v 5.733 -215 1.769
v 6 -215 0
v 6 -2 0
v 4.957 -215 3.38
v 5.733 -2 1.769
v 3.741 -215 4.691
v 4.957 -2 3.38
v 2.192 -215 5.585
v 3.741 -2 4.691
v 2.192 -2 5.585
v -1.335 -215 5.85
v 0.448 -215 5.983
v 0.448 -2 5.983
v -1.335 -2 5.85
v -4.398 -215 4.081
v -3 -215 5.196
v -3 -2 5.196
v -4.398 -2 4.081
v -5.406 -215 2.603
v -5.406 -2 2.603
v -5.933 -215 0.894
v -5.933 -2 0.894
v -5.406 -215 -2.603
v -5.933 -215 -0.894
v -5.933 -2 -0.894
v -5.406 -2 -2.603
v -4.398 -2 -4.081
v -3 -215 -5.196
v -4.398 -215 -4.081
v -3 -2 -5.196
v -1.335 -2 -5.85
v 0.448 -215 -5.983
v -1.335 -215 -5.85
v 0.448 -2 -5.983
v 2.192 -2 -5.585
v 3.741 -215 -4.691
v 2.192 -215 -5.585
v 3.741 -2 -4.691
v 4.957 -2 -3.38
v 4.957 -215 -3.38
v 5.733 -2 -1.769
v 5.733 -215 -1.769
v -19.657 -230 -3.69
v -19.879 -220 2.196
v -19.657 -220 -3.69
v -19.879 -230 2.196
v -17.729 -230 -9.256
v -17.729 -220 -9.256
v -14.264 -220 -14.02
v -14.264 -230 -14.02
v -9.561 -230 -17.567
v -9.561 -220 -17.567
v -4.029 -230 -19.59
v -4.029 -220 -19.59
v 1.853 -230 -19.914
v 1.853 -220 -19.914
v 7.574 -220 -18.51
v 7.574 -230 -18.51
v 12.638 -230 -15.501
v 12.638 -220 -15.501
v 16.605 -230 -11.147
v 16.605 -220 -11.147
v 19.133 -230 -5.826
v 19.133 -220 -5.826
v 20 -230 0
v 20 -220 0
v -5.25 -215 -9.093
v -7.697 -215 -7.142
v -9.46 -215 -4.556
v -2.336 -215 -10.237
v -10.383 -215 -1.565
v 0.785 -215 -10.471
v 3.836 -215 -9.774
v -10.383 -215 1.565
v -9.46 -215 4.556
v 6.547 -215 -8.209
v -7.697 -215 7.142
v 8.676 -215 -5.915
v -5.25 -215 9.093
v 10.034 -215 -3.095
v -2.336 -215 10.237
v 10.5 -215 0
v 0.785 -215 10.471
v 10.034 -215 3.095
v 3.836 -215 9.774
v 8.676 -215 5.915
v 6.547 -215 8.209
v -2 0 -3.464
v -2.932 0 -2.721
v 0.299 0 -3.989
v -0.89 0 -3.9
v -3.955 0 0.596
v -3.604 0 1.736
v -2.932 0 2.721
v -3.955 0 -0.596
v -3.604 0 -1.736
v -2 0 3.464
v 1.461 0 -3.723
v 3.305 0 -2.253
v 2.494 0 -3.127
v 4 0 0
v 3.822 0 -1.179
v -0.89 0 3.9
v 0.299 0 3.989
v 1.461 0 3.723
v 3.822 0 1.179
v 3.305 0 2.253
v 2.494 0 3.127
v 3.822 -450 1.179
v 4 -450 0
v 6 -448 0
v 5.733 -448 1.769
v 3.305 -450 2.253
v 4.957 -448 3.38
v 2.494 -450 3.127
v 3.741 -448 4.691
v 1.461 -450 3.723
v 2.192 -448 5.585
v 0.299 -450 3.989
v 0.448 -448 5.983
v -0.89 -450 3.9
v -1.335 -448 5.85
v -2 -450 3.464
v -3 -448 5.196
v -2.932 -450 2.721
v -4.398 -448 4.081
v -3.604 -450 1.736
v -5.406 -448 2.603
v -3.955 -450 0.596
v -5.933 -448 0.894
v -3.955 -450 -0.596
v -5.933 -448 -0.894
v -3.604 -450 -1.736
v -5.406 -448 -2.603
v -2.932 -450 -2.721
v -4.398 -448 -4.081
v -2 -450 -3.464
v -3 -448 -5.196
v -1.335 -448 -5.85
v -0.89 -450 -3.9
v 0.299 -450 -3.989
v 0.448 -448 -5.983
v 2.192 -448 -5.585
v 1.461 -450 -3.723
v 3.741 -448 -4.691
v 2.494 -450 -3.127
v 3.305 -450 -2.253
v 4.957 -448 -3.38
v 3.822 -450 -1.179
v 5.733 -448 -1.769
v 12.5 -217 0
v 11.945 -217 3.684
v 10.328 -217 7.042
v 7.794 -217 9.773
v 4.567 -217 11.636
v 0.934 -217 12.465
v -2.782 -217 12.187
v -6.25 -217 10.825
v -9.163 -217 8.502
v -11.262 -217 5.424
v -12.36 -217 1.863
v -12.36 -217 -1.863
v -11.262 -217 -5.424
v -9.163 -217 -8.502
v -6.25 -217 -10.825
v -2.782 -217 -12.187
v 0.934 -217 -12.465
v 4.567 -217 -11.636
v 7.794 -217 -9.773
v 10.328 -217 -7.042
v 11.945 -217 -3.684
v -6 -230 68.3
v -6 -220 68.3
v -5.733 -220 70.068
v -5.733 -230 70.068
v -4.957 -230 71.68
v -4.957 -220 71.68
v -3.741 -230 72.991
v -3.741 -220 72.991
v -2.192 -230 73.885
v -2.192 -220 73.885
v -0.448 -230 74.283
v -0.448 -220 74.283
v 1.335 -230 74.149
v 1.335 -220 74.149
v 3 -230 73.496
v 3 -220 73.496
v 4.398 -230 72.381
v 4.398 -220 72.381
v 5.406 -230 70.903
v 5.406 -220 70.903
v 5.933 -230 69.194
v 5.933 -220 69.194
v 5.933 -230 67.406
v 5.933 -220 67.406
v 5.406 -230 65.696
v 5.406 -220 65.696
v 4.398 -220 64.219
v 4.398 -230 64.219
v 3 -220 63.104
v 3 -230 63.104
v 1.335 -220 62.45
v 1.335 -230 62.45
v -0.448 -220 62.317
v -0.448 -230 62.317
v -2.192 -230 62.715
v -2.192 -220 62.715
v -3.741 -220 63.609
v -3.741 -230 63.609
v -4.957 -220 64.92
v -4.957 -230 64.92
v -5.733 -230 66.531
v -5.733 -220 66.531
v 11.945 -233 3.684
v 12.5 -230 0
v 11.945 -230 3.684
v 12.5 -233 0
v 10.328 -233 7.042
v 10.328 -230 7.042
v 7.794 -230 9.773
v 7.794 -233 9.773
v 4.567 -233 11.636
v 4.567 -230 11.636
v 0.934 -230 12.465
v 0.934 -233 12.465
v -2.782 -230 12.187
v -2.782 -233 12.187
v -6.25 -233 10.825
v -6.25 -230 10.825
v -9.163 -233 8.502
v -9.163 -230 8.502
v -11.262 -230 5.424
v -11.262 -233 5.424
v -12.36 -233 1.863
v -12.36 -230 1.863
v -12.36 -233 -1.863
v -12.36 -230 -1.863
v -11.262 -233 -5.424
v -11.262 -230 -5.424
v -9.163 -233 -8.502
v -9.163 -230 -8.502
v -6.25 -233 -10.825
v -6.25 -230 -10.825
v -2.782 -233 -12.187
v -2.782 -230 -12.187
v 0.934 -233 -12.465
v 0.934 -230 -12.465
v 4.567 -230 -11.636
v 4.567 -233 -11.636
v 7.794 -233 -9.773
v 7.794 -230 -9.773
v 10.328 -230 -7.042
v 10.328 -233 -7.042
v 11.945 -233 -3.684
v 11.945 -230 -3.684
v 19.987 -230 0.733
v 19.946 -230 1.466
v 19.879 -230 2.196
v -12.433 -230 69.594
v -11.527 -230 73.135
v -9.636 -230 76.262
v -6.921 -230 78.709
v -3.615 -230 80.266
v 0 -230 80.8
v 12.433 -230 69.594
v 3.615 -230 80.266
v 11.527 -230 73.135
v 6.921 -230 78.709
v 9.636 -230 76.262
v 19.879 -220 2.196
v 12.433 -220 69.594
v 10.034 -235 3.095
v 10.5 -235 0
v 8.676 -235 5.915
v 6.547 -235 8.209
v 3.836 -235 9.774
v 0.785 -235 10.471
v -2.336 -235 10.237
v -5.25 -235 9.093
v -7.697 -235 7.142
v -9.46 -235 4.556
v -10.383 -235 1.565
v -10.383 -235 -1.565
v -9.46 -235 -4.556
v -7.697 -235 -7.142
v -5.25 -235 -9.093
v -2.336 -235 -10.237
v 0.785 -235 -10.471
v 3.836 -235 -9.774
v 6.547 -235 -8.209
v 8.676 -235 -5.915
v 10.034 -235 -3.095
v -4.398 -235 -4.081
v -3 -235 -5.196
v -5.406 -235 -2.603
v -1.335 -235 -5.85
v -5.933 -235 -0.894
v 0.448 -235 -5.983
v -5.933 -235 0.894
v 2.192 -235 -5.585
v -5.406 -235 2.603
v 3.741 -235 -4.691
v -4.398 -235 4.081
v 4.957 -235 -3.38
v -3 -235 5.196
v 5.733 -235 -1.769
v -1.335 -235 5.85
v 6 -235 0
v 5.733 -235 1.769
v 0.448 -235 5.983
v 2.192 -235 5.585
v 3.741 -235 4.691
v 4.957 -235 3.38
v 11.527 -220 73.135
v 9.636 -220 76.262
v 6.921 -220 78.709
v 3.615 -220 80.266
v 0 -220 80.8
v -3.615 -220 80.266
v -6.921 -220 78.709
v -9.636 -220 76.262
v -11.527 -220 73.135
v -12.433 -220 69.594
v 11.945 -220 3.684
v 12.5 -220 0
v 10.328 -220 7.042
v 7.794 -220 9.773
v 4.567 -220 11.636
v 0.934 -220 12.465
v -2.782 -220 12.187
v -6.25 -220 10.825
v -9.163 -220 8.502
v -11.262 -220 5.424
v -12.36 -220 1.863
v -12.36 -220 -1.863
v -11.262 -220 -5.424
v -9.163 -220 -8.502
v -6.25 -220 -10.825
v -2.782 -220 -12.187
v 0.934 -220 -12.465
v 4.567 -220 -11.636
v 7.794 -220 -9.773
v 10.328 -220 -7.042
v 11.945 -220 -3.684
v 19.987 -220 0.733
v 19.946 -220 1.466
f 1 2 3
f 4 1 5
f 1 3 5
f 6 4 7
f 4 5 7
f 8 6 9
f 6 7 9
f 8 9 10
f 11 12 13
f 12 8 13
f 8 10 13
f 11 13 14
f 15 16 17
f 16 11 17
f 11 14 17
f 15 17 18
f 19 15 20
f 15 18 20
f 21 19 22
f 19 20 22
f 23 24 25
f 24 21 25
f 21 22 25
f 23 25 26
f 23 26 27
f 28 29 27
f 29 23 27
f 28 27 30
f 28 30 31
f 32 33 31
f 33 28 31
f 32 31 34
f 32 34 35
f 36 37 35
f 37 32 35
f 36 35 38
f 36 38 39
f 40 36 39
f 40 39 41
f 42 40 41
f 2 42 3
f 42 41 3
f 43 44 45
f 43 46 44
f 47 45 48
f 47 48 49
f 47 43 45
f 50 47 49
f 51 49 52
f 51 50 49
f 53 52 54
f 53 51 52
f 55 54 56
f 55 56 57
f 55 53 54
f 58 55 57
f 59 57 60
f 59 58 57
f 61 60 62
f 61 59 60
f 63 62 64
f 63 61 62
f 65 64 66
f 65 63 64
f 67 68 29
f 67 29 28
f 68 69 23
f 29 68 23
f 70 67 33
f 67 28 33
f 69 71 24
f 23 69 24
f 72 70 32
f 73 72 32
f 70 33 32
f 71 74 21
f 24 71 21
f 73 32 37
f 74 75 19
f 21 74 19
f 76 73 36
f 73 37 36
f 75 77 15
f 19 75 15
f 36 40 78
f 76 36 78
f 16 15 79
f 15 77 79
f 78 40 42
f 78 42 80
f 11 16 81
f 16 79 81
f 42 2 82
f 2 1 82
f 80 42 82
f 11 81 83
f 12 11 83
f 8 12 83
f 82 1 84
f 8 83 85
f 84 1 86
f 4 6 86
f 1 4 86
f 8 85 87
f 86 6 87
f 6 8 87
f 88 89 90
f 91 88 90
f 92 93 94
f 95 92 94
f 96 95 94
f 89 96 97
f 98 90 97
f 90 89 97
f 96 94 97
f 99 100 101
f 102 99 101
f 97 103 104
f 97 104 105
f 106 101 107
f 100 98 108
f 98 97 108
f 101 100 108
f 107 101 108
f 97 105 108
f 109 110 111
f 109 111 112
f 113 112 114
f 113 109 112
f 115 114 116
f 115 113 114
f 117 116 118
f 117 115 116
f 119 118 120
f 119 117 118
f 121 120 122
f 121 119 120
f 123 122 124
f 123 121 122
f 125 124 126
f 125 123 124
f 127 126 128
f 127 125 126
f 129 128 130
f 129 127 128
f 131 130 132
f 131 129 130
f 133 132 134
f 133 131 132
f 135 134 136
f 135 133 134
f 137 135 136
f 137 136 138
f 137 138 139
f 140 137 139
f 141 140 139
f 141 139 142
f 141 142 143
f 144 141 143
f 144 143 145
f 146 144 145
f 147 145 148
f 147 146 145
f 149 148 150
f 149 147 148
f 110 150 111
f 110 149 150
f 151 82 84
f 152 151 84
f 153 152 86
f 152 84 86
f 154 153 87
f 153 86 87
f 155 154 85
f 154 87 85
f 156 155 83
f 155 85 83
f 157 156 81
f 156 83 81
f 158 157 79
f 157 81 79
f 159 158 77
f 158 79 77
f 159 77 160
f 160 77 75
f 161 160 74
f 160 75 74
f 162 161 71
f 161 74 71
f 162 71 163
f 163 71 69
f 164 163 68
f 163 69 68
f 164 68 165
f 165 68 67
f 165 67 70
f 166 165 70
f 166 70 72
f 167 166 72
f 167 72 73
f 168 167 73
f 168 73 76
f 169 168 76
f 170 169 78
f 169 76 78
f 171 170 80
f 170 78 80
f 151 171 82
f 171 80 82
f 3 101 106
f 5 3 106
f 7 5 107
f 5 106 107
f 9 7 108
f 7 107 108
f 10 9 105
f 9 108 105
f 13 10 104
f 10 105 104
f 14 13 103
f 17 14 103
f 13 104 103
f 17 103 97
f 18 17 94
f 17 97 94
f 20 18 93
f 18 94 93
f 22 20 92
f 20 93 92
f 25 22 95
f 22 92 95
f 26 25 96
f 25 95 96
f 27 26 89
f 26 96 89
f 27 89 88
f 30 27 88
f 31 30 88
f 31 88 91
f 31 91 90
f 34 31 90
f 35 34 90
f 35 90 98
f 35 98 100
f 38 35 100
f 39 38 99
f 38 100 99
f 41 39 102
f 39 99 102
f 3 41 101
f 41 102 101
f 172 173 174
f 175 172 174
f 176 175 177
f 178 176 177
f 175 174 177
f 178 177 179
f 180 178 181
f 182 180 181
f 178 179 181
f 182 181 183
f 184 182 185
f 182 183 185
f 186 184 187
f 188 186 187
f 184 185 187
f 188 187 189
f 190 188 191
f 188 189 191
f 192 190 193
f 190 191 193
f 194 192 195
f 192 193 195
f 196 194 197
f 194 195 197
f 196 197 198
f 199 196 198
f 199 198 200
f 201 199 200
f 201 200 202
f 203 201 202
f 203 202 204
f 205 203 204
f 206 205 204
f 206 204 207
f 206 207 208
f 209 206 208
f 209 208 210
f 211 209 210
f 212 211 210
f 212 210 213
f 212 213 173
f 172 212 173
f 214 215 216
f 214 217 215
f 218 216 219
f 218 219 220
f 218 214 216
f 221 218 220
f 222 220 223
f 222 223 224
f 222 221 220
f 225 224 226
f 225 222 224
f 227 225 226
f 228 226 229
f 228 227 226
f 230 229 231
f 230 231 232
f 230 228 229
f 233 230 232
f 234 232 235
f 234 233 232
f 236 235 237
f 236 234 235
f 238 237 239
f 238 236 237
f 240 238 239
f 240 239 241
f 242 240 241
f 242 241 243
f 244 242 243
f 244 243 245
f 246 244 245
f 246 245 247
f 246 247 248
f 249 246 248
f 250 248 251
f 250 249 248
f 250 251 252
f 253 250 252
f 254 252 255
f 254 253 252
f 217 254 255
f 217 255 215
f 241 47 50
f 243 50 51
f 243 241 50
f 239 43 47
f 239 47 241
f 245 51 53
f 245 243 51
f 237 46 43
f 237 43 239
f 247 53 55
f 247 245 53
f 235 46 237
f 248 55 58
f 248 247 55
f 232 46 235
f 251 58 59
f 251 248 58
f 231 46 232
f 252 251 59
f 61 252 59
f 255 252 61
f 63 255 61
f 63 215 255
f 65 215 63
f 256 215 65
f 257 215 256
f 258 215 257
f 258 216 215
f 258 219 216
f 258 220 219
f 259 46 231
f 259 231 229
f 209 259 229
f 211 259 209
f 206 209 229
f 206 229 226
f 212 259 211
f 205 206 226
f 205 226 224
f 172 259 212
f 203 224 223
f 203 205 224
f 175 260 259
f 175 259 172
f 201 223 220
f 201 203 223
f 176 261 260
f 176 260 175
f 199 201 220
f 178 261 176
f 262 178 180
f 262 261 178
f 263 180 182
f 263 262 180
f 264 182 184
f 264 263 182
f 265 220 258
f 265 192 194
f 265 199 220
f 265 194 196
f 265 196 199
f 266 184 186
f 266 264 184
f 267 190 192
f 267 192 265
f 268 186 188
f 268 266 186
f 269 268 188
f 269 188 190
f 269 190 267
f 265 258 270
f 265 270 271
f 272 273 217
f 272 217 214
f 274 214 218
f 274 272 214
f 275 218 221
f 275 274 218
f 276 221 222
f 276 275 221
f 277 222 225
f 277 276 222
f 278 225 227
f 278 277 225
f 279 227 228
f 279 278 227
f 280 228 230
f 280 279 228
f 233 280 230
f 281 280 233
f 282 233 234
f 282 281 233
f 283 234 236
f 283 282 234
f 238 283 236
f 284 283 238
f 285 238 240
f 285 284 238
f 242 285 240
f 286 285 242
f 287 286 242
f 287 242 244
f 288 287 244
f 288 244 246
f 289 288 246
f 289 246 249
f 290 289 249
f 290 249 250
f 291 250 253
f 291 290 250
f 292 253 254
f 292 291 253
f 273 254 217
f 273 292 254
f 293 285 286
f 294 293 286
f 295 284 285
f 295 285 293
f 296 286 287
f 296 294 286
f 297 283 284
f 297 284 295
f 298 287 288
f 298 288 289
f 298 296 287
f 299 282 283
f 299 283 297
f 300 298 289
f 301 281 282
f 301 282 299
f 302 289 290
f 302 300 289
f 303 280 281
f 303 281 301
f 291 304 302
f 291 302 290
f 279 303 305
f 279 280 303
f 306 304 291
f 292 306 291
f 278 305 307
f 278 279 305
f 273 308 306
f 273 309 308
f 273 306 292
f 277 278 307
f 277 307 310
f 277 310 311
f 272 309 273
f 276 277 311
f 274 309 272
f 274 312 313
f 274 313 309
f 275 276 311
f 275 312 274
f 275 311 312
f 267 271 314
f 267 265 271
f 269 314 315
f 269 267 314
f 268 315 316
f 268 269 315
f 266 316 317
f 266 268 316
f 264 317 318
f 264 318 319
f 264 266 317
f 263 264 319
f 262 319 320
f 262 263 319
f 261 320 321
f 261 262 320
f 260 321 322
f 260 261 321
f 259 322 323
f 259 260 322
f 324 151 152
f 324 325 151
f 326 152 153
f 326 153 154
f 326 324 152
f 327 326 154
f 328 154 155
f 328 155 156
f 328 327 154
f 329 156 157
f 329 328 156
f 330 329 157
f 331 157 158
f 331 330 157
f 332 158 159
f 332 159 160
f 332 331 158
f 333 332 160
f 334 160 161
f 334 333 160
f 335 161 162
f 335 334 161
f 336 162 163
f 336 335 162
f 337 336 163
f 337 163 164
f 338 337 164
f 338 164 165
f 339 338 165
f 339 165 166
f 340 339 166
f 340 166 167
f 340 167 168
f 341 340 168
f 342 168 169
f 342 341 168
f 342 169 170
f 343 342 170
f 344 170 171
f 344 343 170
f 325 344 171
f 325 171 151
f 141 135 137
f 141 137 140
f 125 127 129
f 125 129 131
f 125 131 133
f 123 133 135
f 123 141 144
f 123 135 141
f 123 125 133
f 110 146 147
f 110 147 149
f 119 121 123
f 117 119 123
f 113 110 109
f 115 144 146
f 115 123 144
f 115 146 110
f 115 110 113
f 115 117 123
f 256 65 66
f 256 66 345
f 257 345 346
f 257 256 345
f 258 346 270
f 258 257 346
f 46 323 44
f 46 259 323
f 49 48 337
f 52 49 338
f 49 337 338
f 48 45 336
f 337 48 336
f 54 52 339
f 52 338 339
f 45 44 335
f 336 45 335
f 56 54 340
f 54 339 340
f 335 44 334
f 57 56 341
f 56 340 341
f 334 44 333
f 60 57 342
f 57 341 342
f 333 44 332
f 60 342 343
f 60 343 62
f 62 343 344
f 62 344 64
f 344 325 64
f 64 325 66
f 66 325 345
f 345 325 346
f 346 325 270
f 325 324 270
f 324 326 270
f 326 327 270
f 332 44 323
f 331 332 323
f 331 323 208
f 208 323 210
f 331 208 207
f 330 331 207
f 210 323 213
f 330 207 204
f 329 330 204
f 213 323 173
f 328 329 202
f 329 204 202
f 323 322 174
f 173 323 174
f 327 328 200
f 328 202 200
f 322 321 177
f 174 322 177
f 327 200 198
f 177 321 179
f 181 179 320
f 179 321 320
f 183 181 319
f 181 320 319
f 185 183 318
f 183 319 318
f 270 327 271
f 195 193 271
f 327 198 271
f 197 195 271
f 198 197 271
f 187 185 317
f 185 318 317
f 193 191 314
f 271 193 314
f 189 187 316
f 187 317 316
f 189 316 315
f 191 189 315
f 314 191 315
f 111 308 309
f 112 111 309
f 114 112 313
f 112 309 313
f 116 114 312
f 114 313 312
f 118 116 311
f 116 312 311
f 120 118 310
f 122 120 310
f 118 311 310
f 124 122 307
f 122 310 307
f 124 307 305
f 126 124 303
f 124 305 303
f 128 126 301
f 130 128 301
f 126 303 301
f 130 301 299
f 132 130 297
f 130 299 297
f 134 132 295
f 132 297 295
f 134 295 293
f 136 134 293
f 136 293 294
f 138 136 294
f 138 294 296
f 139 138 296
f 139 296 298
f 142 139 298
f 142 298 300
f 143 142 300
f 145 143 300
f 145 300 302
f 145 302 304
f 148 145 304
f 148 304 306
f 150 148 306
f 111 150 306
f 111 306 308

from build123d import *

# Parameters (mm, degrees)
F0_R      = 6
F1_DEPTH  = 450
F2_SIZE   = 2
F4_R      = 12.5
F5_DEPTH  = 10
F6_SIZE   = 2
F8_DEPTH  = 5
F10_D     = 12
F10_DEPTH = 30


with BuildPart() as f1:
    # F0 (on Front) → F1 (new body)
    with BuildSketch(Plane.XZ):
        Circle(F0_R)
    extrude(amount=F1_DEPTH)

    # F2
    f2_edges = [f1.edges().sort_by_distance(p)[0] for p in [
        (-6, -450, 0),
        (-6, 0, 0),
    ]]
    chamfer(f2_edges, length=F2_SIZE)

    # F4 (on offset) → F5 (join, symmetric)
    with BuildSketch(Plane.XZ.offset(225)):
        Circle(F4_R)
    extrude(amount=F5_DEPTH, both=True)

    # F6
    f6_edges = [f1.edges().sort_by_distance(p)[0] for p in [
        (-12.5, -235, 0),
        (-12.5, -215, 0),
    ]]
    chamfer(f6_edges, length=F6_SIZE)

    # F7 (on offset) → F8 (join, symmetric)
    with BuildSketch(Plane.XZ.offset(225)):
        with BuildLine():
            ThreePointArc((19.879044, 2.196272), (1e-06, 20), (-19.879044, 2.196273))
            ThreePointArc((-19.879044, 2.196273), (-1.099801, -19.969738), (20, 0))
            ThreePointArc((20, 0), (19.969738, 1.0998), (19.879044, 2.196272))
        make_face()
        with BuildLine():
            Line((-12.432798, 69.594193), (-19.879044, 2.196273))
            ThreePointArc((-19.879044, 2.196273), (1e-06, 20), (19.879044, 2.196272))
            Line((19.879044, 2.196272), (12.432798, 69.594193))
            ThreePointArc((12.432798, 69.594193), (12.483188, 68.947853), (12.5, 68.29977))
            ThreePointArc((12.5, 68.29977), (-0.648083, 55.816582), (-12.432798, 69.594193))
        make_face()
        with BuildLine():
            ThreePointArc((12.432798, 69.594193), (0, 80.79977), (-12.432798, 69.594193))
            ThreePointArc((-12.432798, 69.594193), (-0.648083, 55.816582), (12.5, 68.29977))
            ThreePointArc((12.5, 68.29977), (12.483188, 68.947853), (12.432798, 69.594193))
        make_face()
    extrude(amount=F8_DEPTH, both=True)

    # F10
    with Locations(Plane.XZ.offset(230)):
        with Locations((0, 68.29977)):
            Hole(F10_D / 2, depth=F10_DEPTH)


solid = f1.part
